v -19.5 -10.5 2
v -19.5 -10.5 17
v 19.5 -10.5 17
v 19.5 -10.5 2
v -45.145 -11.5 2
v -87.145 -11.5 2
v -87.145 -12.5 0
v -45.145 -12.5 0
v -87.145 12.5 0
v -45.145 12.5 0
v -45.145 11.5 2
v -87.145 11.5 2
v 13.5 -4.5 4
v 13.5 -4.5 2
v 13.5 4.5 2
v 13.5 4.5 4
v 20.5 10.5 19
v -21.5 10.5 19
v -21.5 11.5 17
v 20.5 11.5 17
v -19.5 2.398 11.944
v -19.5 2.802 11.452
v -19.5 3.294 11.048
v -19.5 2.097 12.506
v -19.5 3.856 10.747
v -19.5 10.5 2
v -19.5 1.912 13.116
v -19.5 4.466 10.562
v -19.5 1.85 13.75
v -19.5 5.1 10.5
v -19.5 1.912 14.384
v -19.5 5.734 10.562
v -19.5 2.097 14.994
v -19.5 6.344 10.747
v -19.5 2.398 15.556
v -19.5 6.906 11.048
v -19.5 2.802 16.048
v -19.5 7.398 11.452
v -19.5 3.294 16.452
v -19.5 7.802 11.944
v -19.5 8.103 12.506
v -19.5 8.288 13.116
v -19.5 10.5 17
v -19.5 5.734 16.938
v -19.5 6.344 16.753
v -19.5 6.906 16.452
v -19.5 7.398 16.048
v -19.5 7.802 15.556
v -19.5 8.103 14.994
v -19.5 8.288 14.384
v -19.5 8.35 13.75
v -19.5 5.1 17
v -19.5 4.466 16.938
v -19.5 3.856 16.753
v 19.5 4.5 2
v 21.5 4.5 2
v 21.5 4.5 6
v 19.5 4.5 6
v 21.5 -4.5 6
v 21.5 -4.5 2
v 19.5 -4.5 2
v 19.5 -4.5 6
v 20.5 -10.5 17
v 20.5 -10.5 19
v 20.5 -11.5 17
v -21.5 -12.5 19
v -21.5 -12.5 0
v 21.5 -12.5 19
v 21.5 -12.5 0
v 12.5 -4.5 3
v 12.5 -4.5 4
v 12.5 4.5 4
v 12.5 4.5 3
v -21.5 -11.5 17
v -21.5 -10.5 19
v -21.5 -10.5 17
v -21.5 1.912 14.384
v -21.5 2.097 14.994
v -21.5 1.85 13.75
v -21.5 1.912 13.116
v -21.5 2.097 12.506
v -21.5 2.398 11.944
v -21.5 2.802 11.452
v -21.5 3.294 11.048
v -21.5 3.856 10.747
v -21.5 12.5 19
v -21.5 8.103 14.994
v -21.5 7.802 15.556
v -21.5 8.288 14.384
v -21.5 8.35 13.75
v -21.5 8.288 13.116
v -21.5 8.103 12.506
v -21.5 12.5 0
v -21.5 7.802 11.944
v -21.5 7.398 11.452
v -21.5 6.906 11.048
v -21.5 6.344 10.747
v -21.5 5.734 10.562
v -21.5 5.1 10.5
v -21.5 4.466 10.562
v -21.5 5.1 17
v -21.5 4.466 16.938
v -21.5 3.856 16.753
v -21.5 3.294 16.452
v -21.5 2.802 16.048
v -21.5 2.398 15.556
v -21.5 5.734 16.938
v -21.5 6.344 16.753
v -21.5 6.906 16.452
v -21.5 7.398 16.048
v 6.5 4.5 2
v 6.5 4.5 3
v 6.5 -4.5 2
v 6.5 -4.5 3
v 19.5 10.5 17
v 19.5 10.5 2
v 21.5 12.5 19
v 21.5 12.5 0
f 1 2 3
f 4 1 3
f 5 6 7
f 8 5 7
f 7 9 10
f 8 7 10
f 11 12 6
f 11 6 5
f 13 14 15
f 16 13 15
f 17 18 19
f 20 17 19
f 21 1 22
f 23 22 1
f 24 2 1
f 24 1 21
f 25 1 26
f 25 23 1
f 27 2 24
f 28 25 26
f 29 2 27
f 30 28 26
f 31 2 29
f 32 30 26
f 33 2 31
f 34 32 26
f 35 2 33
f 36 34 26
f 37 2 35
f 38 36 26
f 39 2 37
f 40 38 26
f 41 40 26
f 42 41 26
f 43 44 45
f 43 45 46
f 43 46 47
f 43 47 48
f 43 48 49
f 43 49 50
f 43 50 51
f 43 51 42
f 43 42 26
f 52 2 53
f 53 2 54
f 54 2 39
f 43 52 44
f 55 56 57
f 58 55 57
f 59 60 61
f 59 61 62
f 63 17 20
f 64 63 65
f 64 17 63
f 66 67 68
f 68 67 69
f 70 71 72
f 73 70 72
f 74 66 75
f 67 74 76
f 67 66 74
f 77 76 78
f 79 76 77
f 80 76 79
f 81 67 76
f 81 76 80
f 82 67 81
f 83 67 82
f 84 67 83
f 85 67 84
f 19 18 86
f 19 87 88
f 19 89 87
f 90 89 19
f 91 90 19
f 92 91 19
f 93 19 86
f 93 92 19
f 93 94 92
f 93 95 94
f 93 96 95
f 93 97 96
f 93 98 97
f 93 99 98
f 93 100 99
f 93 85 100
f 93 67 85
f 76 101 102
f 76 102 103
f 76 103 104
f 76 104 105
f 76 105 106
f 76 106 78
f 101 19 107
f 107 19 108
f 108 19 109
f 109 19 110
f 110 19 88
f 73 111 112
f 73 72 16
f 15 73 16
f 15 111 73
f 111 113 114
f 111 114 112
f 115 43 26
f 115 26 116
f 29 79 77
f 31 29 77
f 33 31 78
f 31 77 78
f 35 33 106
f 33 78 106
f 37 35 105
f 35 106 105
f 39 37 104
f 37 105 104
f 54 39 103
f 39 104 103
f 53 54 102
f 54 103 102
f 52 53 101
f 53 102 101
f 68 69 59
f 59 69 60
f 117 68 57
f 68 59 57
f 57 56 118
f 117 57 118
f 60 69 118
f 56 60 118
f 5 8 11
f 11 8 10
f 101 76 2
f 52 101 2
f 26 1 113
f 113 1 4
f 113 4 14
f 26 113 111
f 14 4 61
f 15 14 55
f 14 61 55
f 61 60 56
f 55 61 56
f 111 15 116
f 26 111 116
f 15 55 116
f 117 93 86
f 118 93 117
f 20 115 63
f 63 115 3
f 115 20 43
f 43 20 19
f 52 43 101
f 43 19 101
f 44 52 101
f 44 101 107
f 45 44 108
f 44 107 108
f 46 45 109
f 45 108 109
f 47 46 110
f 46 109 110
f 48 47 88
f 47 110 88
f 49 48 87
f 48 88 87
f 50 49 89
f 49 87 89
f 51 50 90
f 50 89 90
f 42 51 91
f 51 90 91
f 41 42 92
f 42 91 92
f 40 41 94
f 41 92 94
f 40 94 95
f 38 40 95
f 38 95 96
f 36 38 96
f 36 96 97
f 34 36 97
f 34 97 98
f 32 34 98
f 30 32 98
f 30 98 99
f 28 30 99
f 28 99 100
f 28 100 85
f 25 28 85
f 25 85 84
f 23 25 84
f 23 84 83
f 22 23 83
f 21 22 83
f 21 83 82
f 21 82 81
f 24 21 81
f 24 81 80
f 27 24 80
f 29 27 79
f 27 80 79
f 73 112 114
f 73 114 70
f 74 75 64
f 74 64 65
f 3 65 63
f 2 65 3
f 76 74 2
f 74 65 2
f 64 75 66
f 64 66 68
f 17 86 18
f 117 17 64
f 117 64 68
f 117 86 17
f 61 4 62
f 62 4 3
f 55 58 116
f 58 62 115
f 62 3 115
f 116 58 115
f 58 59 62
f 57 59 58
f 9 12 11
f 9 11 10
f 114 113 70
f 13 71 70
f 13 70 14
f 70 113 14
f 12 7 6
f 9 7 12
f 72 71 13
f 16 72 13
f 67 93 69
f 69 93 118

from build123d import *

# Parameters (mm, degrees)
SKETCH_W        = 43
SKETCH_H        = 25
PAD_DEPTH       = 19
SKETCH001_W     = 39
SKETCH001_H     = 21
POCKET_DEPTH    = 17
SKETCH002_W     = 9
SKETCH002_H     = 4
POCKET001_DEPTH = 2
SKETCH003_W     = 21
SKETCH003_H     = 2
POCKET002_DEPTH = 1
SKETCH004_W     = 2
SKETCH004_H     = 21
POCKET003_DEPTH = 2
SKETCH005_W     = 7
SKETCH005_H     = 9
PAD001_DEPTH    = 2
SKETCH006_W     = 6
SKETCH006_H     = 9
POCKET004_DEPTH = 1
SKETCH007_R     = 3.25
POCKET005_DEPTH = 2
POCKET006_DEPTH = 42
SKETCH010_W     = 42
SKETCH010_H     = 25
PAD002_DEPTH    = 2
POCKET007_DEPTH = 42


with BuildPart() as body:
    # Sketch → Pad (new body)
    with BuildSketch(Plane.XY):
        Rectangle(SKETCH_W, SKETCH_H)
    extrude(amount=PAD_DEPTH)

    # Sketch001 (on Face6 of Pad) → Pocket (cut)
    with BuildSketch(Plane.XY.offset(19)):
        Rectangle(SKETCH001_W, SKETCH001_H)
    extrude(amount=-POCKET_DEPTH, mode=Mode.SUBTRACT)

    # Sketch002 (on Face6 of Pocket) → Pocket001 (cut)
    with BuildSketch(Plane.YZ.offset(21.5)):
        with Locations((0, 4)):
            Rectangle(SKETCH002_W, SKETCH002_H)
    extrude(amount=-POCKET001_DEPTH, mode=Mode.SUBTRACT)

    # Sketch003 (on Face9 of Pocket001) → Pocket002 (cut)
    with BuildSketch(Plane(origin=(19.5, 0, 0), x_dir=(0, -1, 0), z_dir=(-1, 0, 0))):
        with Locations((0, 18)):
            Rectangle(SKETCH003_W, SKETCH003_H)
    extrude(amount=-POCKET002_DEPTH, mode=Mode.SUBTRACT)

    # Sketch004 (on Face5 of Pocket002) → Pocket003 (cut)
    with BuildSketch(Plane.XY.offset(19)):
        with Locations((-20.5, 0)):
            Rectangle(SKETCH004_W, SKETCH004_H)
    extrude(amount=-POCKET003_DEPTH, mode=Mode.SUBTRACT)

    # Sketch005 (on Face21 of Pocket003) → Pad001 (join)
    with BuildSketch(Plane.XY.offset(2)):
        with Locations((10, 0)):
            Rectangle(SKETCH005_W, SKETCH005_H)
    extrude(amount=PAD001_DEPTH)

    # Sketch006 (on Face27 of Pad001) → Pocket004 (cut)
    with BuildSketch(Plane.XY.offset(4)):
        with Locations((9.5, 0)):
            Rectangle(SKETCH006_W, SKETCH006_H)
    extrude(amount=-POCKET004_DEPTH, mode=Mode.SUBTRACT)

    # Sketch007 (on Face1 of Pocket004) → Pocket005 (cut)
    with BuildSketch(Plane(origin=(-21.5, 0, 0), x_dir=(0, -1, 0), z_dir=(-1, 0, 0))):
        with Locations((-5.1, 13.75)):
            Circle(SKETCH007_R)
    extrude(amount=-POCKET005_DEPTH, mode=Mode.SUBTRACT)

    # Sketch009 (on Face1 of Pocket005) → Pocket006 (cut)
    with BuildSketch(Plane(origin=(-21.5, 0, 0), x_dir=(0, -1, 0), z_dir=(-1, 0, 0))):
        Polygon((-10.5, 19), (-11.5, 17), (-10.5, 17), align=None)
    pocket006 = extrude(amount=-POCKET006_DEPTH, mode=Mode.SUBTRACT)

    # Mirrored: Pocket006 across Sketch009 V_Axis
    add(pocket006.mirror(Plane(origin=(-21.5, 0, 0), x_dir=(-1, 0, 0), z_dir=(0, -1, 0))), mode=Mode.SUBTRACT)


with BuildPart() as body001:
    # Sketch010 → Pad002 (new body)
    with BuildSketch(Plane.XY):
        with Locations((-66.144579, 0)):
            Rectangle(SKETCH010_W, SKETCH010_H)
    extrude(amount=PAD002_DEPTH)

    # Sketch011 (on Face1 of Pad002) → Pocket007 (cut)
    with BuildSketch(Plane(origin=(-87.144579, 0, 0), x_dir=(0, -1, 0), z_dir=(-1, 0, 0))):
        Polygon((-11.5, 2), (-12.5, 0), (-12.5, 2), align=None)
    pocket007 = extrude(amount=-POCKET007_DEPTH, mode=Mode.SUBTRACT)

    # Mirrored001: Pocket007 across Sketch011 V_Axis
    add(pocket007.mirror(Plane(origin=(-87.144579, 0, 0), x_dir=(-1, 0, 0), z_dir=(0, -1, 0))), mode=Mode.SUBTRACT)


solid = Compound([body.part, body001.part])
